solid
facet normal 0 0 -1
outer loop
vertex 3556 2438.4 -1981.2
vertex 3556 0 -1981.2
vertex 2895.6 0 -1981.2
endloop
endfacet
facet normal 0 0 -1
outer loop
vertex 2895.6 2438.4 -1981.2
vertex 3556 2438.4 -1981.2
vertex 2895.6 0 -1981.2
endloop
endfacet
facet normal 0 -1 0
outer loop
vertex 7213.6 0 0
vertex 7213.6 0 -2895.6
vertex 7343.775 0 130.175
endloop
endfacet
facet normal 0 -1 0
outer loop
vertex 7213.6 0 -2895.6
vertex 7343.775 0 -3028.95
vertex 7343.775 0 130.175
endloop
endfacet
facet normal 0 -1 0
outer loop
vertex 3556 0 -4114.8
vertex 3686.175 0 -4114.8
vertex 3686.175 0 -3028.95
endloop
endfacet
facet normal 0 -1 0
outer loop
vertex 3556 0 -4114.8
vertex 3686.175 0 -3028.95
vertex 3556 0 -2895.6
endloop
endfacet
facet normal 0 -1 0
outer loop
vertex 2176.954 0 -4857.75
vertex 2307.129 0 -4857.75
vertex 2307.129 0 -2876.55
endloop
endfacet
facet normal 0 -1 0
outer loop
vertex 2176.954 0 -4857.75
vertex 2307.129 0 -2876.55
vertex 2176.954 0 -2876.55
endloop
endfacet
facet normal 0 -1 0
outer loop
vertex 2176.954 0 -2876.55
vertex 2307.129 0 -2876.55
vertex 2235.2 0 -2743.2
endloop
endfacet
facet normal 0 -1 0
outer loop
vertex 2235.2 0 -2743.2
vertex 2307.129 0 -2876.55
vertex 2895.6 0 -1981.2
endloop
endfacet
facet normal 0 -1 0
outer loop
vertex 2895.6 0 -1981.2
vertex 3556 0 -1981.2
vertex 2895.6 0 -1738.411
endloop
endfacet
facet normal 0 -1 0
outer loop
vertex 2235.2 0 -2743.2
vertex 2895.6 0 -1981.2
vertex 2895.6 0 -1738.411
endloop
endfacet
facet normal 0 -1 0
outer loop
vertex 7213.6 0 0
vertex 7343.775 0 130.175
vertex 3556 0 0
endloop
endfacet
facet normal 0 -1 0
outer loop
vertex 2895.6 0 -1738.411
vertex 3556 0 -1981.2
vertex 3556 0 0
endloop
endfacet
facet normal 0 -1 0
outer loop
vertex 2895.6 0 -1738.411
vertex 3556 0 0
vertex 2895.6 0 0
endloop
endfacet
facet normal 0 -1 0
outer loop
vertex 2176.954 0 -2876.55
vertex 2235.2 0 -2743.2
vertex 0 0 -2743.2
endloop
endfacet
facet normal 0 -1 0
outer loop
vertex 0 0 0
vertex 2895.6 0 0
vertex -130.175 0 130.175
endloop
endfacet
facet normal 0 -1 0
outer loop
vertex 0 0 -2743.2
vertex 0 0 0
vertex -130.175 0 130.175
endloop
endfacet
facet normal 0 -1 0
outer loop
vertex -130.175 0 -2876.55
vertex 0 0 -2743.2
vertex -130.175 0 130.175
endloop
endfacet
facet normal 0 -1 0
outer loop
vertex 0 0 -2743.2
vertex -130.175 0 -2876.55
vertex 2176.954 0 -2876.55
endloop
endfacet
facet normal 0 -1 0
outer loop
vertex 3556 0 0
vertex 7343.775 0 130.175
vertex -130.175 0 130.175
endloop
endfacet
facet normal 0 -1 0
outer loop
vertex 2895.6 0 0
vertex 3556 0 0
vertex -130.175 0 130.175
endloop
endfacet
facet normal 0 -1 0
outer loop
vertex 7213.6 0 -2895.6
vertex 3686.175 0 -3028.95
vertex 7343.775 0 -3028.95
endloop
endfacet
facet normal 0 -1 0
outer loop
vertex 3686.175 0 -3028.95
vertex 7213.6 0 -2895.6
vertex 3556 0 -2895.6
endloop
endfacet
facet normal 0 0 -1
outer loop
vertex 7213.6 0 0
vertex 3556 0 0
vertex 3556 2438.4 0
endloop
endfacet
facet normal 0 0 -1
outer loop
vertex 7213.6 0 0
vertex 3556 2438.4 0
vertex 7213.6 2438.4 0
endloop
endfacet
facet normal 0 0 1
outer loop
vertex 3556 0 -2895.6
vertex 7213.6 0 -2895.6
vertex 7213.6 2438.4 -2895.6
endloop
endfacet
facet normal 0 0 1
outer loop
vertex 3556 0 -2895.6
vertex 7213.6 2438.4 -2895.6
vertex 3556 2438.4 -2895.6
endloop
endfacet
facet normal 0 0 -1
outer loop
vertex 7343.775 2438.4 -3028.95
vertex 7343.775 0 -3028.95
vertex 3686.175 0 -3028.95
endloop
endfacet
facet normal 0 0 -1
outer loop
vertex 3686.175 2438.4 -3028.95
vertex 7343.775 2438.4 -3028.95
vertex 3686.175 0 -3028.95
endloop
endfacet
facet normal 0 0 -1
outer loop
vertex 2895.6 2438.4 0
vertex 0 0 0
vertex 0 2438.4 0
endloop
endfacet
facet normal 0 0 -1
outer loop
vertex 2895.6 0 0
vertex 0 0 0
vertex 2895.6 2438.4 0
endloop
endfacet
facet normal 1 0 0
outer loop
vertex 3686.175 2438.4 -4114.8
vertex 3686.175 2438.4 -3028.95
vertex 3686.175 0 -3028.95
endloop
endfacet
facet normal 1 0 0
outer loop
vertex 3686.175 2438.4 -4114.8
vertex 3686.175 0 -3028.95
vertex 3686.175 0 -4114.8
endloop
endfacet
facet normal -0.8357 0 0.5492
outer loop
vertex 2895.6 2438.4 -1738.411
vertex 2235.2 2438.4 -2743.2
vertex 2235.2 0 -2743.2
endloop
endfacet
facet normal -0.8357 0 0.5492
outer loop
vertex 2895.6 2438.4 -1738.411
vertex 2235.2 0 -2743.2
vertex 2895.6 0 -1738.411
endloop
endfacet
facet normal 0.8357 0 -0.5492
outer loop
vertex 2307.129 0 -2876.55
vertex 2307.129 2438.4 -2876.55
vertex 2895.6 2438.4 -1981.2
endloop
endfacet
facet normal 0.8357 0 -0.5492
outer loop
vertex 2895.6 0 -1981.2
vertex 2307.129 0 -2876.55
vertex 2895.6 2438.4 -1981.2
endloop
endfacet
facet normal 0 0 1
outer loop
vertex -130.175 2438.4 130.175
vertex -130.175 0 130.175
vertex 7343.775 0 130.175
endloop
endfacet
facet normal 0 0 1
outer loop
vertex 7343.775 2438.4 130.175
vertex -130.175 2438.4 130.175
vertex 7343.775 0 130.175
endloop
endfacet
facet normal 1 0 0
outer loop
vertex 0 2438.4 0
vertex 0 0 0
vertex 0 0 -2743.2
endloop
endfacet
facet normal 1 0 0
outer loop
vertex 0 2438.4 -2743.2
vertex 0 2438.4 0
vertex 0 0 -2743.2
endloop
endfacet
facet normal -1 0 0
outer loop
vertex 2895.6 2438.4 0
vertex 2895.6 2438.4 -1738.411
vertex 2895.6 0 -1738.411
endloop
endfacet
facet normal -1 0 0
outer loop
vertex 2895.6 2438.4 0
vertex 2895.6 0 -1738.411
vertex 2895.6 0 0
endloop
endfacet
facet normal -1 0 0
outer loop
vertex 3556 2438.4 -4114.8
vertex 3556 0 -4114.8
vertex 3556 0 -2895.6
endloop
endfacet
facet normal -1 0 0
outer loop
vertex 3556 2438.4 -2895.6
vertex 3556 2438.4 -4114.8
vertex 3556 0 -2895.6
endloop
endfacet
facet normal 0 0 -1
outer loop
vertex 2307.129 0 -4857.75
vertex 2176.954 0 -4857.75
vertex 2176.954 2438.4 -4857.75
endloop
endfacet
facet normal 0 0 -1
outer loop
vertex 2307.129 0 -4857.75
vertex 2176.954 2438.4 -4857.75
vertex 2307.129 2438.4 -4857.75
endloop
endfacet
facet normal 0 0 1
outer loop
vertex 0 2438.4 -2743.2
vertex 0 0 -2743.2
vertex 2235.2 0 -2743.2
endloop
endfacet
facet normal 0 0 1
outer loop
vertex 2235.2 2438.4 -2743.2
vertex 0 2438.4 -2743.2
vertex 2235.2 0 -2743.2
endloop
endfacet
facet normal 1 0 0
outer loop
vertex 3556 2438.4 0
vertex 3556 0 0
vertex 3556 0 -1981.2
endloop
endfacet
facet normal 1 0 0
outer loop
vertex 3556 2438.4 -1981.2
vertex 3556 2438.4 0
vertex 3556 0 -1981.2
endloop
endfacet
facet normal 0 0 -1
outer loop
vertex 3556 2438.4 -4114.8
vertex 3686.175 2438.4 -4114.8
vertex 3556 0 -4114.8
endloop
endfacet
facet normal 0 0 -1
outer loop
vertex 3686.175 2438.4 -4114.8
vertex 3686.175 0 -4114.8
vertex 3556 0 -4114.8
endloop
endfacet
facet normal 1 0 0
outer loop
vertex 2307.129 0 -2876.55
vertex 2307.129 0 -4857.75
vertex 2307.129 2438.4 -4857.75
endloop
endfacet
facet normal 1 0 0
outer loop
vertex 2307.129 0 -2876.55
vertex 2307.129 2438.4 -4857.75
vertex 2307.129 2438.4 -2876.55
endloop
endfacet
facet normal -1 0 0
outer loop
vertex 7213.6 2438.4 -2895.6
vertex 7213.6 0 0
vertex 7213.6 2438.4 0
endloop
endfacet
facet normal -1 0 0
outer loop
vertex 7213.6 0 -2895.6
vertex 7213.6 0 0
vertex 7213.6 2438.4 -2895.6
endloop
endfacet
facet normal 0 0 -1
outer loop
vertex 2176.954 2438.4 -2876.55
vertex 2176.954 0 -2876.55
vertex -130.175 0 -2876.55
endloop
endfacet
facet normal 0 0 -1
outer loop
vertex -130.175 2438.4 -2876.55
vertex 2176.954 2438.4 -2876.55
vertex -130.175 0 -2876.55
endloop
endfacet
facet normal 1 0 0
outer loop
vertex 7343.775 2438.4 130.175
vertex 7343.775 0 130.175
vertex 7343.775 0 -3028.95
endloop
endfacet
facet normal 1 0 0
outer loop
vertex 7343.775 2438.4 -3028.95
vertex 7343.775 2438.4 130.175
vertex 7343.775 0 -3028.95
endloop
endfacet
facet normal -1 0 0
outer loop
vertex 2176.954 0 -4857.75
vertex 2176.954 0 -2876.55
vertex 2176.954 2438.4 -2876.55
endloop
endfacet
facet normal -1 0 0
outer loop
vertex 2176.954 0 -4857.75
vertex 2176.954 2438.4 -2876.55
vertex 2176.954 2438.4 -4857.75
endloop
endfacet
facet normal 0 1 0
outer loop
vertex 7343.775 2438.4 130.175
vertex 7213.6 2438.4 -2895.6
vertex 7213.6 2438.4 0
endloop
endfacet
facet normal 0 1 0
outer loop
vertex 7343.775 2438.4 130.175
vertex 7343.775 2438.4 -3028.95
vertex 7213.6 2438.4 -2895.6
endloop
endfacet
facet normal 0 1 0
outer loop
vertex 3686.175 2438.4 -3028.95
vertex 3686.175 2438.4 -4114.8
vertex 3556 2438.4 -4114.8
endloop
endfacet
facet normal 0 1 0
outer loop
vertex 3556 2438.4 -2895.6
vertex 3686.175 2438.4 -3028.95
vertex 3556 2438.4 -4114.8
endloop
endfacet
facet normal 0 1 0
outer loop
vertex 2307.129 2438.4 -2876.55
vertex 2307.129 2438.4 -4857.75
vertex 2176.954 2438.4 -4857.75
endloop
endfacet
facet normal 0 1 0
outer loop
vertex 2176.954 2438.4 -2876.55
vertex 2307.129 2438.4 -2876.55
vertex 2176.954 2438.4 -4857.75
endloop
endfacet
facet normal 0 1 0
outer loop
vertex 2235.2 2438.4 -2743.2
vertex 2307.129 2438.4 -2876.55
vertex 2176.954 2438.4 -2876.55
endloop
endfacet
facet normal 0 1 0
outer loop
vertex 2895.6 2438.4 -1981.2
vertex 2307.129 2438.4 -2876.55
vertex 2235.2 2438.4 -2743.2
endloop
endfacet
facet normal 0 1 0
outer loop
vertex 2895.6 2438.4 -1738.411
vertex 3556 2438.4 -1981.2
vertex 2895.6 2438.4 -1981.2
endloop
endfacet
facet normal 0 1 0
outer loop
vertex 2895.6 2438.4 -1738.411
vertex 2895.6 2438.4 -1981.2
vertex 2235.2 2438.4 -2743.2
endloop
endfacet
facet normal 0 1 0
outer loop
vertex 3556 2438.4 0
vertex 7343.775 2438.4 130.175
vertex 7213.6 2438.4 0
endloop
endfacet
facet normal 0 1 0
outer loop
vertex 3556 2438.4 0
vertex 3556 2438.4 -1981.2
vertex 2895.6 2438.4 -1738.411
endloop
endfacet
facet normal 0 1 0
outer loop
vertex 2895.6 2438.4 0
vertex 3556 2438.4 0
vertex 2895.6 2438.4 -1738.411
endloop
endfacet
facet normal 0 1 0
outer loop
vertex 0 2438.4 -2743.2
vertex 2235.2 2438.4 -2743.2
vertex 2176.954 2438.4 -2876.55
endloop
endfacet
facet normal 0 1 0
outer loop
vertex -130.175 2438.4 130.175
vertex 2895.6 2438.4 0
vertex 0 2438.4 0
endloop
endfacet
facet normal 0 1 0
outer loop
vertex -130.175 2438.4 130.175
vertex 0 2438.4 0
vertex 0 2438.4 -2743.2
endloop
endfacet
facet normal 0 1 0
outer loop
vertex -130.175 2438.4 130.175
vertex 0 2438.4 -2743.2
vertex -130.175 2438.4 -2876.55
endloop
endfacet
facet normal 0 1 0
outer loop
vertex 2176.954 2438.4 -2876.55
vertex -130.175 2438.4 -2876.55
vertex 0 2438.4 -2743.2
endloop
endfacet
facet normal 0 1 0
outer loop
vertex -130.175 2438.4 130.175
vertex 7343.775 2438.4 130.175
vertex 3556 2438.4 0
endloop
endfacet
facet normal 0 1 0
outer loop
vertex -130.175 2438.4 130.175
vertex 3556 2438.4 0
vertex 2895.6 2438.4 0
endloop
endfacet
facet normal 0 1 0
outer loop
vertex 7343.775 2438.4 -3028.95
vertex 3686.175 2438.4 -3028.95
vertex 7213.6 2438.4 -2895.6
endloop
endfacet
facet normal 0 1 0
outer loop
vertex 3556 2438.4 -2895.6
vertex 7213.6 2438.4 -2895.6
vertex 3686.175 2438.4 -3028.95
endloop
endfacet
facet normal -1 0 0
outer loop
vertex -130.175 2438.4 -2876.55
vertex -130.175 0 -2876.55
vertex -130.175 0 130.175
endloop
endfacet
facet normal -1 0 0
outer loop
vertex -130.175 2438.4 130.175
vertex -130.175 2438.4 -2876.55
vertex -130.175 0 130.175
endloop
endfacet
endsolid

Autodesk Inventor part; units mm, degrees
ref_plane "YZ Plane" through (0, 0, 0) normal (1, 0, 0) x (0, 1, 0)
ref_plane "XZ Plane" through (0, 0, 0) normal (0, 1, 0) x (-1, 0, 0)
ref_plane "XY Plane" through (0, 0, 0) normal (0, 0, 1) x (1, 0, 0)
sketch "Sketch1" plane through (0, 0, 0) normal (0, 1, 0) x (-1, 0, 0)
  line L0 (0, 0) -> (0, -2743.2)
  line L1 (0, -2743.2) -> (-2235.2, -2743.2)
  line L2 (0, 0) -> (-7213.6, 0)
  line L3 (-2895.6, 0) -> (-3556, 0)
  line L4 (-3556, 0) -> (-3556, -1981.2)
  line L5 (-3556, -1981.2) -> (-2895.6, -1981.2)
  line L6 (-2895.6, -1738.4107) -> (-2895.6, 0)
  line L7 (-7213.6, 0) -> (-7213.6, -2895.6)
  line L8 (-7213.6, -2895.6) -> (-3556, -2895.6)
  line L9 (-2176.9542, -2876.55) -> (130.175, -2876.55)
  line L10 (130.175, -2876.55) -> (130.175, 130.175)
  line L11 (130.175, 130.175) -> (-7343.775, 130.175)
  line L12 (-7343.775, 130.175) -> (-7343.775, -3028.95)
  line L13 (-7343.775, -3028.95) -> (-3686.175, -3028.95)
  line L14 (-3556, -4114.8) -> (-3556, -2895.6)
  line L15 (-2307.1292, -2876.55) -> (-2895.6, -1981.2)
  line L16 (-2235.2, -2743.2) -> (-2895.6, -1738.4107)
  line L17 (-2176.9542, -2876.55) -> (-2176.9542, -4857.75)
  line L18 (-2176.9542, -4857.75) -> (-2307.1292, -4857.75)
  line L19 (-2307.1292, -4857.75) -> (-2307.1292, -2876.55)
  line L20 (-3686.175, -3028.95) -> (-3686.175, -4114.8)
  line L21 (-3686.175, -4114.8) -> (-3556, -4114.8)
  point P0 (-2601.3646, -2428.875)
  dimension "d1" = 2743.2
  dimension "d3" = 7213.6
  dimension "d4" = 2895.6
  dimension "d5" = 660.4
  dimension "d6" = 1981.2
  dimension "d7" = 914.4
  dimension "d8" = 3657.6
  dimension "d10" = 130.175
  dimension "d11" = 130.175
  dimension "d12" = 130.175
  dimension "d13" = 133.35
  dimension "d16" = 133.35
  dimension "d21" = 1219.2
  dimension "d22" = 130.175
  dimension "d24" = 2235.2
  dimension "d25" = 1981.2
  dimension "d26" = 133.35
  dimension "d27" = 130.175
  dimension "d28" = 58.2458
extrude "Extrusion1" add sketch "Sketch1" along normal blind 2438.4
properties part number "Existing_Kitchen_And_Dining_Room" material "Glass"
